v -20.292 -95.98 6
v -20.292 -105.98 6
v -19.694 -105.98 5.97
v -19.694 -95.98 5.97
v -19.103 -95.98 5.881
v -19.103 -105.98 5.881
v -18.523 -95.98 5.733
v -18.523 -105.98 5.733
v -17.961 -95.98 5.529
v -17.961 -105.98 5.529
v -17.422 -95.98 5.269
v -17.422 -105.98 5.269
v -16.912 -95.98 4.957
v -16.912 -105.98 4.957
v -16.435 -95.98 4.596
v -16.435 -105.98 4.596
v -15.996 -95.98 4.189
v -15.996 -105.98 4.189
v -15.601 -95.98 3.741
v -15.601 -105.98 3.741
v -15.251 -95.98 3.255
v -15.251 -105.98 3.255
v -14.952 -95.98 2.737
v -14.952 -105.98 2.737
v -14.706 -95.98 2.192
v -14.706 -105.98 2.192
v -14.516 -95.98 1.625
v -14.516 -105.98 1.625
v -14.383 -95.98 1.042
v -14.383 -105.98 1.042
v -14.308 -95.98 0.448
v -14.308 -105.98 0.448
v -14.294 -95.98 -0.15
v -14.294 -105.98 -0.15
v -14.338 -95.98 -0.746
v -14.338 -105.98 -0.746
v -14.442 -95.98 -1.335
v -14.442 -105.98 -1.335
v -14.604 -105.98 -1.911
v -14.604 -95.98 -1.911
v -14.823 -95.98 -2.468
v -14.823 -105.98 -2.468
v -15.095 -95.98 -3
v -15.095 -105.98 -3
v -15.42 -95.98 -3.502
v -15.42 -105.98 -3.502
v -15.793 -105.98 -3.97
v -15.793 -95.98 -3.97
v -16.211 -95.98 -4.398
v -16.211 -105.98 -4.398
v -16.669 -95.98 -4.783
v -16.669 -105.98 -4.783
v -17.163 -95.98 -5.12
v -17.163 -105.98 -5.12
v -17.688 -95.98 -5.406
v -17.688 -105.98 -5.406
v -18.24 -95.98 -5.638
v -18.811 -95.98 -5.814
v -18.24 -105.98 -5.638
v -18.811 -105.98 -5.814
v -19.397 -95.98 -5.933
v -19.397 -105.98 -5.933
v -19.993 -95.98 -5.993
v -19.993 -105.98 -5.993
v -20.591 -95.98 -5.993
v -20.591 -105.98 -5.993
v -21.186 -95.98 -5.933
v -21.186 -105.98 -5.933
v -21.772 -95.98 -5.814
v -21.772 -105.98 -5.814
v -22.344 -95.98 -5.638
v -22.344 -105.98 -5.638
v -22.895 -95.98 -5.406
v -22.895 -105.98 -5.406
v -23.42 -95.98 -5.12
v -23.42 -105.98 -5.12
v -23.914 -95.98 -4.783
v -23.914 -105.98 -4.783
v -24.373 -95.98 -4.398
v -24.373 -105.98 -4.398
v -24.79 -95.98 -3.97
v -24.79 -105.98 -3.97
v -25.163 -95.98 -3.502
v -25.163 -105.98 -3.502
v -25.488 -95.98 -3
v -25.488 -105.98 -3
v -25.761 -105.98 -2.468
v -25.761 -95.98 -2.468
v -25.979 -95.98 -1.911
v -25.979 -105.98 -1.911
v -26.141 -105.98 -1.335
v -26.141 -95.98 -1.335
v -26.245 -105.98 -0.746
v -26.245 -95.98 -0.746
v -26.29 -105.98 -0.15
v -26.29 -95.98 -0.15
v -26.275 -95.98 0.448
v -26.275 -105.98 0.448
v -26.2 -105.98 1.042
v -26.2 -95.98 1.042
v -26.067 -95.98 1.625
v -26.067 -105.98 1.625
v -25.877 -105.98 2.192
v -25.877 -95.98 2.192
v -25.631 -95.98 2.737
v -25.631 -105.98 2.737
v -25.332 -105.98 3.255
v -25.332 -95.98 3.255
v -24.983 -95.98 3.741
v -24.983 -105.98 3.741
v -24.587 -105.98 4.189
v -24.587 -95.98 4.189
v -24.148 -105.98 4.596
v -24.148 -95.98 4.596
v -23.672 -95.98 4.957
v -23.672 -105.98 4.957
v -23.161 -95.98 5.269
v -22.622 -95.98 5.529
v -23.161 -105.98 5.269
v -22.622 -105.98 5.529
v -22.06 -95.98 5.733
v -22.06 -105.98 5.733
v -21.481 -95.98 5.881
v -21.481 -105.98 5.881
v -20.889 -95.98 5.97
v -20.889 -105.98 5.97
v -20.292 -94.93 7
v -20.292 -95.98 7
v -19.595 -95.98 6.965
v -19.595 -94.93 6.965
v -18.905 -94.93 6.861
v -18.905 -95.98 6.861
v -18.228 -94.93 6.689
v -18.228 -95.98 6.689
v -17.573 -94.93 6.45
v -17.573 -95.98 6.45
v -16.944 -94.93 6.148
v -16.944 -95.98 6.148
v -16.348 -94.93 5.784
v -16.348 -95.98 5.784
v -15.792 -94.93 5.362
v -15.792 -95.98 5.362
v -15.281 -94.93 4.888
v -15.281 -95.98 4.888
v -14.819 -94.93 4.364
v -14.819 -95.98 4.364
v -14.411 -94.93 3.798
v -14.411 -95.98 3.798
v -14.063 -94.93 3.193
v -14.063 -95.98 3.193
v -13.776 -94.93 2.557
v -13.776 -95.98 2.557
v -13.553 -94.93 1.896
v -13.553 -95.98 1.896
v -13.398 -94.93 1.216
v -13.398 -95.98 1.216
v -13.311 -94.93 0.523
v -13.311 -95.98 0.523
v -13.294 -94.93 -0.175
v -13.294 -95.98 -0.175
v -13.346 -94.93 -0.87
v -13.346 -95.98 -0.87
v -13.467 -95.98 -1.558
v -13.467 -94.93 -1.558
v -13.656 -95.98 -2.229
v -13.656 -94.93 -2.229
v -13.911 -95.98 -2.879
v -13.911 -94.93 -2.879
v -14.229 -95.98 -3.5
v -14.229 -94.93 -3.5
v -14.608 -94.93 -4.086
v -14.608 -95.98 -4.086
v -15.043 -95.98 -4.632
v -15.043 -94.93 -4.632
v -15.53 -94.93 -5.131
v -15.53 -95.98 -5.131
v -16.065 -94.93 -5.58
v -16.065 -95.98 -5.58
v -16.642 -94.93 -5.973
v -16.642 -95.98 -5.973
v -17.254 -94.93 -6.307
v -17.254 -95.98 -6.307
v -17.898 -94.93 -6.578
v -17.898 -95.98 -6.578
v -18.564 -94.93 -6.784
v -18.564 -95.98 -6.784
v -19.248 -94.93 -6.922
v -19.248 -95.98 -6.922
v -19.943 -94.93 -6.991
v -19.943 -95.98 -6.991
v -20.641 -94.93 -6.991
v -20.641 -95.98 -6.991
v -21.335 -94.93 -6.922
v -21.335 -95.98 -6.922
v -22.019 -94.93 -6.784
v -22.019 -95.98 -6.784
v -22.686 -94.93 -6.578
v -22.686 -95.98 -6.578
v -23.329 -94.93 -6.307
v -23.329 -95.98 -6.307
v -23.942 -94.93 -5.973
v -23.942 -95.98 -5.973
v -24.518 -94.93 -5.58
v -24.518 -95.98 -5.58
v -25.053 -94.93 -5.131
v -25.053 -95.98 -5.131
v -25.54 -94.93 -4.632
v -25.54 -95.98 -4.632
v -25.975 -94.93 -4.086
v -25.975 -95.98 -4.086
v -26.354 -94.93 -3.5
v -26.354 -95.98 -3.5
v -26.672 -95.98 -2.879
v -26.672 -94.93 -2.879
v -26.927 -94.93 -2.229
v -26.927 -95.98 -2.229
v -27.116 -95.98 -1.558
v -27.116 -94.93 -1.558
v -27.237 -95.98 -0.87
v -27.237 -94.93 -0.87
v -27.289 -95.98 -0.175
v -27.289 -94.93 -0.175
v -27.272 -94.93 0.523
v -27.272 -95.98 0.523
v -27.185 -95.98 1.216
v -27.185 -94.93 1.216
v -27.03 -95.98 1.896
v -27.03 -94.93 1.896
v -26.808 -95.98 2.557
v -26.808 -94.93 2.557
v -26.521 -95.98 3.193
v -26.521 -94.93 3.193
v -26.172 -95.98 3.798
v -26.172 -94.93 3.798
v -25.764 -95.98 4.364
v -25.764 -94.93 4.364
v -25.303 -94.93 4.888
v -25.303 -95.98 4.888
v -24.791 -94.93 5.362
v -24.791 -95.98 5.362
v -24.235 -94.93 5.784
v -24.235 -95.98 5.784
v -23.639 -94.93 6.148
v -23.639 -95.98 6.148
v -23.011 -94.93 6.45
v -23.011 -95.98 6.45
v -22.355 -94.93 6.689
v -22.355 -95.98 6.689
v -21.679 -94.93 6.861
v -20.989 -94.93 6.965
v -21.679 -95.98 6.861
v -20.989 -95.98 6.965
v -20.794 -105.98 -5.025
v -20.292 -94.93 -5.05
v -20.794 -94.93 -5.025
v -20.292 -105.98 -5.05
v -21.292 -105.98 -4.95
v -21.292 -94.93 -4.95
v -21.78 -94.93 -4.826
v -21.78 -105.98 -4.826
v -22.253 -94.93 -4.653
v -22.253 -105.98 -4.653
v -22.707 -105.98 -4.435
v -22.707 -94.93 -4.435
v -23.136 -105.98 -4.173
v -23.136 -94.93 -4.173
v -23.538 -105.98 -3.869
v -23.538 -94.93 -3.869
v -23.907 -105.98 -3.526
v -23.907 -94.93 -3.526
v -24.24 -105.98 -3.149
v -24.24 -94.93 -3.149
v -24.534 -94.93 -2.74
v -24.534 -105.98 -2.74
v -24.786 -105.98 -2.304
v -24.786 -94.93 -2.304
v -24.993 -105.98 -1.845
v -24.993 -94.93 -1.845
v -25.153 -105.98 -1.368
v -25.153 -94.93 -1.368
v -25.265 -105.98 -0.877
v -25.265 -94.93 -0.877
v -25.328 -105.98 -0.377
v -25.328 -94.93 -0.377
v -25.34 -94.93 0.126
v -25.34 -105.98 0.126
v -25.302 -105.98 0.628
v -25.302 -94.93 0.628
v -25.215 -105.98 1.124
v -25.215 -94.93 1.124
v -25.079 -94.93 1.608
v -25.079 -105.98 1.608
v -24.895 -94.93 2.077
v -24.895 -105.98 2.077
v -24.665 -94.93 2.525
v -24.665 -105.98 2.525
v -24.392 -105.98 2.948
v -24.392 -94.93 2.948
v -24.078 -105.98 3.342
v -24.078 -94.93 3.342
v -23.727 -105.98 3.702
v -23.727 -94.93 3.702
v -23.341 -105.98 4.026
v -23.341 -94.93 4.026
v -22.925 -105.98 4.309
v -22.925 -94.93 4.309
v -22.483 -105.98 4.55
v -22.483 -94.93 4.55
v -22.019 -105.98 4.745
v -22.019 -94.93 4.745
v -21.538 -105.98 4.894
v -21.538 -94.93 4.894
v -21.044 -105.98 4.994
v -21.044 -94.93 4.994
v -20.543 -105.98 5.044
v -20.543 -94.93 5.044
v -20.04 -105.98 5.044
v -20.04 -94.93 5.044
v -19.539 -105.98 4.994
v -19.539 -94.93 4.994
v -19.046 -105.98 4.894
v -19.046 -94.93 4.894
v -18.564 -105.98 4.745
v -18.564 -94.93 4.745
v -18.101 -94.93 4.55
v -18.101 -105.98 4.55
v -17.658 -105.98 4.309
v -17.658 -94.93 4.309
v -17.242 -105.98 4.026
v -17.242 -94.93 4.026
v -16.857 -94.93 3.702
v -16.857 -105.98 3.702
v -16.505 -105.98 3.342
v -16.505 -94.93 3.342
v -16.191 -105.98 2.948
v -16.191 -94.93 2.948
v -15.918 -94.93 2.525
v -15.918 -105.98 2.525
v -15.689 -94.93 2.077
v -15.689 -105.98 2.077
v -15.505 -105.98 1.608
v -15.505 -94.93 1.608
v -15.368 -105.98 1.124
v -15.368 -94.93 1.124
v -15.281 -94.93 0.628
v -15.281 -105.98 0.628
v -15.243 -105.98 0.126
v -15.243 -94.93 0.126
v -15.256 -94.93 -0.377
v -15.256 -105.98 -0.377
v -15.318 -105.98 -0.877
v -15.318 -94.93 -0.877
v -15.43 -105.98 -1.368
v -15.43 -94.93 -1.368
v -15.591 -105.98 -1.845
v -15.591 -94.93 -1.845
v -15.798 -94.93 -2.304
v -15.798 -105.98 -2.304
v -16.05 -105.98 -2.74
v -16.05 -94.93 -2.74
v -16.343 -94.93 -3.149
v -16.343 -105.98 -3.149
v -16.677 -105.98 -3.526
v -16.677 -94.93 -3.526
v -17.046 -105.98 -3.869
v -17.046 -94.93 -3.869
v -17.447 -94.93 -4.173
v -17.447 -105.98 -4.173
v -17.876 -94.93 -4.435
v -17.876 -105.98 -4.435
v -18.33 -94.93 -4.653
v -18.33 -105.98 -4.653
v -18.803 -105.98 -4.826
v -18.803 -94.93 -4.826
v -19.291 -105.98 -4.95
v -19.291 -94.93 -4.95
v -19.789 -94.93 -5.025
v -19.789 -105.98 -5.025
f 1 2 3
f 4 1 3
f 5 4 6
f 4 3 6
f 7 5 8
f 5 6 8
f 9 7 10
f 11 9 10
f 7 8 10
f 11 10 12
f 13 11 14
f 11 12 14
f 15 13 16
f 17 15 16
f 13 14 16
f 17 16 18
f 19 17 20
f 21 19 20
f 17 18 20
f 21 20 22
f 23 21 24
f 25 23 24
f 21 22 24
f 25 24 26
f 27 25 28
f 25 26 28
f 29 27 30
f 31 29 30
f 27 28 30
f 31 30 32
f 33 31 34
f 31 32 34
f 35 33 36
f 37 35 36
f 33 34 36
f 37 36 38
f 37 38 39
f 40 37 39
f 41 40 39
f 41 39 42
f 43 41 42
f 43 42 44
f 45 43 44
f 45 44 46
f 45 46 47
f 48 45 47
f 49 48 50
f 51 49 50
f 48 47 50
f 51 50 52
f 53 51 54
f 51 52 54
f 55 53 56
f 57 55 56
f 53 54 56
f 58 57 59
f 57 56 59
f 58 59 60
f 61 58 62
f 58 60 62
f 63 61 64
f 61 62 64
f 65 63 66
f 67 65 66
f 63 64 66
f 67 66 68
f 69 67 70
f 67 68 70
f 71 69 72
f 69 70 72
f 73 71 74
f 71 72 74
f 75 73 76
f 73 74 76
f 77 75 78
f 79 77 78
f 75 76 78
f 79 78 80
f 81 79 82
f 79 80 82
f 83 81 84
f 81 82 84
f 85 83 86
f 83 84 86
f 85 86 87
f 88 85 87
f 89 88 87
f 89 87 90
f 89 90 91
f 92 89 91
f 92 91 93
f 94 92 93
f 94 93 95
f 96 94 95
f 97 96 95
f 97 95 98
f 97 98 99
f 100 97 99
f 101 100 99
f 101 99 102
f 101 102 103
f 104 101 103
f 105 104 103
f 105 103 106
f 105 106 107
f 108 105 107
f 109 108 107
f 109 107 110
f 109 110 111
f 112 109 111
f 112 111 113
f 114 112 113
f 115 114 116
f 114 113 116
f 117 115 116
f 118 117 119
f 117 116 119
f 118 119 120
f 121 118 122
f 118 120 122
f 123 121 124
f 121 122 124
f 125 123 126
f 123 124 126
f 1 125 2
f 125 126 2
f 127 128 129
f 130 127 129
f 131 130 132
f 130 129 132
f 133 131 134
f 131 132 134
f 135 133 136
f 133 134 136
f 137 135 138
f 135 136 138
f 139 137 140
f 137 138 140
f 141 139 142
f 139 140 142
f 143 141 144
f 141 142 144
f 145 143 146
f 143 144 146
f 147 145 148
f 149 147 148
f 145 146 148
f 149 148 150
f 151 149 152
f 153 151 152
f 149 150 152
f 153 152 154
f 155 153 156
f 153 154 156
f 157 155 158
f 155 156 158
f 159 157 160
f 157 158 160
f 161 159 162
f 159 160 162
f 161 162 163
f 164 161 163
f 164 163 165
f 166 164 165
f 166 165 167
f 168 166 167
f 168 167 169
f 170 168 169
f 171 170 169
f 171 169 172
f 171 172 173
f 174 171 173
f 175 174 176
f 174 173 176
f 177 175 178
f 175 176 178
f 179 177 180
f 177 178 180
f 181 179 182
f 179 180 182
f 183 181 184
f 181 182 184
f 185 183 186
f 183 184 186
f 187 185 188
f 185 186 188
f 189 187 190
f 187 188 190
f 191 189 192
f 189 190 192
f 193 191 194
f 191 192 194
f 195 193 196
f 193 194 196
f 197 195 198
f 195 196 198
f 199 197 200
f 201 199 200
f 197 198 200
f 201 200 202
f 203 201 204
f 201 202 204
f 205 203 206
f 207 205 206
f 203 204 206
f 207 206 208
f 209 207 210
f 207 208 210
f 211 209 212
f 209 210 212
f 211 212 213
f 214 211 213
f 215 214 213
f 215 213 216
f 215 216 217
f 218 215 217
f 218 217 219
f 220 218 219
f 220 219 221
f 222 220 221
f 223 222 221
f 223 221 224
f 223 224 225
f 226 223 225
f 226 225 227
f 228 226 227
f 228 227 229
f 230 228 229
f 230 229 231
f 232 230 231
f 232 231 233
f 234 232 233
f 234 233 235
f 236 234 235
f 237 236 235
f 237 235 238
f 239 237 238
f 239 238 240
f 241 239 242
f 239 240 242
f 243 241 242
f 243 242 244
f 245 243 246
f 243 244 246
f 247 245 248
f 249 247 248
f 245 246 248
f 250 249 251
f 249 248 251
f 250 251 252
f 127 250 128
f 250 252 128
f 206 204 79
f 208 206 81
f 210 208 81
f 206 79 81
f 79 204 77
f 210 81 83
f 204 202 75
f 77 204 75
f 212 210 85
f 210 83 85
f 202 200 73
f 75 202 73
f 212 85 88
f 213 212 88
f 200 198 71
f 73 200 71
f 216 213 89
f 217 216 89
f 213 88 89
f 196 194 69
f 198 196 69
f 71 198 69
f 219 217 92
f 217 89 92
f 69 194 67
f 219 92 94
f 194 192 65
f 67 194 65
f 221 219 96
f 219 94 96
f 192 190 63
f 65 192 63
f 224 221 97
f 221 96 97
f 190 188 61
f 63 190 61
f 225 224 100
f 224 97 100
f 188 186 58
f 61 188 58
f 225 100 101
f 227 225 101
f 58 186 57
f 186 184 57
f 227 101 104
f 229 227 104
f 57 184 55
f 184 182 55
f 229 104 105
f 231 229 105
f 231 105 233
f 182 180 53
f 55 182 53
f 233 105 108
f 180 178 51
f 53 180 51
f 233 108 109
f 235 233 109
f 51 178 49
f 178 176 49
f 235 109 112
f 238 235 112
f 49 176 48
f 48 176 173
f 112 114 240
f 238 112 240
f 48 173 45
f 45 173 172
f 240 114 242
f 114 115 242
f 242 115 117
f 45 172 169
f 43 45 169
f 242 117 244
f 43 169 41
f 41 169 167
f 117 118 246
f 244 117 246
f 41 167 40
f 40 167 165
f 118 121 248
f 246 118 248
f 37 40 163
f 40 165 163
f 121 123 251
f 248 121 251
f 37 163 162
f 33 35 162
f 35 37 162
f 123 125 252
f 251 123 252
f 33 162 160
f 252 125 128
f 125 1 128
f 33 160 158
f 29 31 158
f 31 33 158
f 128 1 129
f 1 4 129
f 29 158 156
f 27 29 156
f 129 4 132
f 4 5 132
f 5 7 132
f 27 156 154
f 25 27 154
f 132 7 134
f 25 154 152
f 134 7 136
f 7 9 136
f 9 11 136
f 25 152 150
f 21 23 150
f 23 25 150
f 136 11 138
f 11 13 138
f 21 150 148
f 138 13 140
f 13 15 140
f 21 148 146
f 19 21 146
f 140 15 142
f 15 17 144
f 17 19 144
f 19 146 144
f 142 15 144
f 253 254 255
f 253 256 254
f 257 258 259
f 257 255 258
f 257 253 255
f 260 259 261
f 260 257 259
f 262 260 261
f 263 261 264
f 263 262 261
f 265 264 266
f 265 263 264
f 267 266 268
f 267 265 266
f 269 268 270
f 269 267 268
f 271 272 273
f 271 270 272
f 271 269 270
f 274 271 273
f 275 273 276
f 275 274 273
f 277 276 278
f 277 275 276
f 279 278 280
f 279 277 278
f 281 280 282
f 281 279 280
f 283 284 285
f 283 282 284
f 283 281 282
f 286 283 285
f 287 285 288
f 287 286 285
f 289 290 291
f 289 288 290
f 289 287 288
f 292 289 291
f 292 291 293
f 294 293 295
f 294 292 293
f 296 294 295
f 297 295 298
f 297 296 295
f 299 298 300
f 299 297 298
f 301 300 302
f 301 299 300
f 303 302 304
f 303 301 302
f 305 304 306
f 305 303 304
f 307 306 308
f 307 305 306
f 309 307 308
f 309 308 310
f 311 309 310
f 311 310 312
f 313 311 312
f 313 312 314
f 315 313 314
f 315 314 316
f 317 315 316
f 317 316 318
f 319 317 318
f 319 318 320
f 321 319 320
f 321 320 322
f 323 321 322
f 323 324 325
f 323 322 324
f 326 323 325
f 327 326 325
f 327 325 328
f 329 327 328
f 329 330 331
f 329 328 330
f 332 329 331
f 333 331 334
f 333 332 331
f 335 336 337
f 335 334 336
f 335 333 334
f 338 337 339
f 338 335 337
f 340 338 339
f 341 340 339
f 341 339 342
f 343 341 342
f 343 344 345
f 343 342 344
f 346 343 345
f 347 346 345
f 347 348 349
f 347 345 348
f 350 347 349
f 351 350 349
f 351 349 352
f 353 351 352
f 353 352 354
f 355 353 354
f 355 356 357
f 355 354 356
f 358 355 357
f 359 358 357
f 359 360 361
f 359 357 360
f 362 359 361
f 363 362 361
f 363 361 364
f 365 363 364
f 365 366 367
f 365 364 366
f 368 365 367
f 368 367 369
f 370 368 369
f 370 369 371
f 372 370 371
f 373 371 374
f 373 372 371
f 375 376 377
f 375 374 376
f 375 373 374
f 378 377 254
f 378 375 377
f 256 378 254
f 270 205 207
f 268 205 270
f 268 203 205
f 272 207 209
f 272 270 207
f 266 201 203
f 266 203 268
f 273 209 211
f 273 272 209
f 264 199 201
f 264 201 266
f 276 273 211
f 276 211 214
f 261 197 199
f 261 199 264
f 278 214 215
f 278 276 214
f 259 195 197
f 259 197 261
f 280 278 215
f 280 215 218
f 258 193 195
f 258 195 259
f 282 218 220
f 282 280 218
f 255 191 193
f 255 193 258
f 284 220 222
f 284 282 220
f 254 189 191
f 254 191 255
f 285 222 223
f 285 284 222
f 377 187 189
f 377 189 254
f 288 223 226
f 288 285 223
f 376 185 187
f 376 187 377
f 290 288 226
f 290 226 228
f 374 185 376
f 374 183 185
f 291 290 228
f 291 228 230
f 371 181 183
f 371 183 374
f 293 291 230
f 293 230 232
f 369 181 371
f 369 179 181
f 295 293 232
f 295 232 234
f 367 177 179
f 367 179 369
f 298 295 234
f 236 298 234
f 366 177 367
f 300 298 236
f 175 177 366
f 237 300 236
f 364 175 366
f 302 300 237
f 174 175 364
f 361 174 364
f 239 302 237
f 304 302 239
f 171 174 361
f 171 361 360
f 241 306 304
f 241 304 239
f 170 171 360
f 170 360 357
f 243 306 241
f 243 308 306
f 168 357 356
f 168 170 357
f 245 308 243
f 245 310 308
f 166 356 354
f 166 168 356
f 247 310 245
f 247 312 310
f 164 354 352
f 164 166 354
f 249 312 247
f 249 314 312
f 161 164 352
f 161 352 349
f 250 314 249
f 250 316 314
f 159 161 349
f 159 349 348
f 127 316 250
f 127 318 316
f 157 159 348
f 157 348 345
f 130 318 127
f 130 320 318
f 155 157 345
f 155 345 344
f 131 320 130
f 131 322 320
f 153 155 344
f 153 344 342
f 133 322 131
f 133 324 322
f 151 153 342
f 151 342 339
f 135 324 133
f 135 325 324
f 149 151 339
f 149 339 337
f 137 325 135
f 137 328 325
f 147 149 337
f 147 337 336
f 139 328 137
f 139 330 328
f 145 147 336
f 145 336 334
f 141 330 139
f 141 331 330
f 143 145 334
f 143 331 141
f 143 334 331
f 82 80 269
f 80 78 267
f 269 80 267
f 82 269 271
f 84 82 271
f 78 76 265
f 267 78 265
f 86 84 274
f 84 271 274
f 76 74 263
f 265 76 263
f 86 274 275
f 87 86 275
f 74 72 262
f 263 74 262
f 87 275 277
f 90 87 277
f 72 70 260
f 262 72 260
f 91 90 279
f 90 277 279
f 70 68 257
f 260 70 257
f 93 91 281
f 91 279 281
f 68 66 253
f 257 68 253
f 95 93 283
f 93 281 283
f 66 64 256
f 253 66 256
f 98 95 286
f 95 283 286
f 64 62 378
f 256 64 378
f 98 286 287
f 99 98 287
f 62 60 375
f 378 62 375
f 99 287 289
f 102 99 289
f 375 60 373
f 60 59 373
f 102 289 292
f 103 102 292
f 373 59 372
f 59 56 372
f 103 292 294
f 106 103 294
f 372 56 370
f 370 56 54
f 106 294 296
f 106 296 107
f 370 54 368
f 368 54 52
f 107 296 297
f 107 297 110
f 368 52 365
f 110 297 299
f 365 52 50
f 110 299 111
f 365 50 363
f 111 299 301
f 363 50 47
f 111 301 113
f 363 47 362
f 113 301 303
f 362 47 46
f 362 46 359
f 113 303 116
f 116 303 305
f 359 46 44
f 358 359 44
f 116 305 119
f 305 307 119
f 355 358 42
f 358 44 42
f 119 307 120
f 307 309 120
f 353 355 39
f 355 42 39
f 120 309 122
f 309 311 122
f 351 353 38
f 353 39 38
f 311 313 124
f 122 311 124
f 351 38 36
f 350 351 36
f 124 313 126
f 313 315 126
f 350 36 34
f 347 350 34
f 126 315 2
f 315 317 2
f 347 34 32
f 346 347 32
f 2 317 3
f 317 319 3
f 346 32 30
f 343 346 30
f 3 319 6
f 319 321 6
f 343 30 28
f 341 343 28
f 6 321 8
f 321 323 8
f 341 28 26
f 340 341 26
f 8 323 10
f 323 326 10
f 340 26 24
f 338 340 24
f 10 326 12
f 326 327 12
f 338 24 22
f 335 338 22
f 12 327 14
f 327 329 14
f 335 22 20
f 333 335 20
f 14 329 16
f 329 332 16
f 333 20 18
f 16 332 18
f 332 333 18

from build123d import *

# Parameters (mm, degrees)
GUIDE_BUSH_BARREL_SKETCH_R = 6
GUIDE_BUSH_BARREL_DEPTH    = 10
GUIDE_BUSH_FLANGE_SKETCH_R = 7
GUIDE_BUSH_FLANGE_DEPTH    = 1.05
RUNNING_BORE_SKETCH_R      = 5.05
RUNNING_BORE_DEPTH         = 11.25


with BuildPart() as part:
    # Guide bush barrel sketch → Guide bush barrel (new body)
    with BuildSketch(Plane(origin=(0, -105.98, 0), x_dir=(1, 0, 0), z_dir=(0, 1, 0))):
        with Locations(Location((-20.291651246, 0, 0), (0, 0, 270))):
            Circle(GUIDE_BUSH_BARREL_SKETCH_R)
    extrude(amount=GUIDE_BUSH_BARREL_DEPTH)

    # Guide bush flange sketch → Guide bush flange (add)
    with BuildSketch(Plane(origin=(0, -95.98, 0), x_dir=(1, 0, 0), z_dir=(0, 1, 0))):
        with Locations(Location((-20.291651246, 0, 0), (0, 0, 270))):
            Circle(GUIDE_BUSH_FLANGE_SKETCH_R)
    extrude(amount=GUIDE_BUSH_FLANGE_DEPTH)

    # Running bore sketch → Running bore (cut)
    with BuildSketch(Plane(origin=(0, -106.08, 0), x_dir=(1, 0, 0), z_dir=(0, 1, 0))):
        with Locations(Location((-20.291651246, 0, 0), (0, 0, 90))):
            Circle(RUNNING_BORE_SKETCH_R)
    extrude(amount=RUNNING_BORE_DEPTH, mode=Mode.SUBTRACT)


solid = part.part
